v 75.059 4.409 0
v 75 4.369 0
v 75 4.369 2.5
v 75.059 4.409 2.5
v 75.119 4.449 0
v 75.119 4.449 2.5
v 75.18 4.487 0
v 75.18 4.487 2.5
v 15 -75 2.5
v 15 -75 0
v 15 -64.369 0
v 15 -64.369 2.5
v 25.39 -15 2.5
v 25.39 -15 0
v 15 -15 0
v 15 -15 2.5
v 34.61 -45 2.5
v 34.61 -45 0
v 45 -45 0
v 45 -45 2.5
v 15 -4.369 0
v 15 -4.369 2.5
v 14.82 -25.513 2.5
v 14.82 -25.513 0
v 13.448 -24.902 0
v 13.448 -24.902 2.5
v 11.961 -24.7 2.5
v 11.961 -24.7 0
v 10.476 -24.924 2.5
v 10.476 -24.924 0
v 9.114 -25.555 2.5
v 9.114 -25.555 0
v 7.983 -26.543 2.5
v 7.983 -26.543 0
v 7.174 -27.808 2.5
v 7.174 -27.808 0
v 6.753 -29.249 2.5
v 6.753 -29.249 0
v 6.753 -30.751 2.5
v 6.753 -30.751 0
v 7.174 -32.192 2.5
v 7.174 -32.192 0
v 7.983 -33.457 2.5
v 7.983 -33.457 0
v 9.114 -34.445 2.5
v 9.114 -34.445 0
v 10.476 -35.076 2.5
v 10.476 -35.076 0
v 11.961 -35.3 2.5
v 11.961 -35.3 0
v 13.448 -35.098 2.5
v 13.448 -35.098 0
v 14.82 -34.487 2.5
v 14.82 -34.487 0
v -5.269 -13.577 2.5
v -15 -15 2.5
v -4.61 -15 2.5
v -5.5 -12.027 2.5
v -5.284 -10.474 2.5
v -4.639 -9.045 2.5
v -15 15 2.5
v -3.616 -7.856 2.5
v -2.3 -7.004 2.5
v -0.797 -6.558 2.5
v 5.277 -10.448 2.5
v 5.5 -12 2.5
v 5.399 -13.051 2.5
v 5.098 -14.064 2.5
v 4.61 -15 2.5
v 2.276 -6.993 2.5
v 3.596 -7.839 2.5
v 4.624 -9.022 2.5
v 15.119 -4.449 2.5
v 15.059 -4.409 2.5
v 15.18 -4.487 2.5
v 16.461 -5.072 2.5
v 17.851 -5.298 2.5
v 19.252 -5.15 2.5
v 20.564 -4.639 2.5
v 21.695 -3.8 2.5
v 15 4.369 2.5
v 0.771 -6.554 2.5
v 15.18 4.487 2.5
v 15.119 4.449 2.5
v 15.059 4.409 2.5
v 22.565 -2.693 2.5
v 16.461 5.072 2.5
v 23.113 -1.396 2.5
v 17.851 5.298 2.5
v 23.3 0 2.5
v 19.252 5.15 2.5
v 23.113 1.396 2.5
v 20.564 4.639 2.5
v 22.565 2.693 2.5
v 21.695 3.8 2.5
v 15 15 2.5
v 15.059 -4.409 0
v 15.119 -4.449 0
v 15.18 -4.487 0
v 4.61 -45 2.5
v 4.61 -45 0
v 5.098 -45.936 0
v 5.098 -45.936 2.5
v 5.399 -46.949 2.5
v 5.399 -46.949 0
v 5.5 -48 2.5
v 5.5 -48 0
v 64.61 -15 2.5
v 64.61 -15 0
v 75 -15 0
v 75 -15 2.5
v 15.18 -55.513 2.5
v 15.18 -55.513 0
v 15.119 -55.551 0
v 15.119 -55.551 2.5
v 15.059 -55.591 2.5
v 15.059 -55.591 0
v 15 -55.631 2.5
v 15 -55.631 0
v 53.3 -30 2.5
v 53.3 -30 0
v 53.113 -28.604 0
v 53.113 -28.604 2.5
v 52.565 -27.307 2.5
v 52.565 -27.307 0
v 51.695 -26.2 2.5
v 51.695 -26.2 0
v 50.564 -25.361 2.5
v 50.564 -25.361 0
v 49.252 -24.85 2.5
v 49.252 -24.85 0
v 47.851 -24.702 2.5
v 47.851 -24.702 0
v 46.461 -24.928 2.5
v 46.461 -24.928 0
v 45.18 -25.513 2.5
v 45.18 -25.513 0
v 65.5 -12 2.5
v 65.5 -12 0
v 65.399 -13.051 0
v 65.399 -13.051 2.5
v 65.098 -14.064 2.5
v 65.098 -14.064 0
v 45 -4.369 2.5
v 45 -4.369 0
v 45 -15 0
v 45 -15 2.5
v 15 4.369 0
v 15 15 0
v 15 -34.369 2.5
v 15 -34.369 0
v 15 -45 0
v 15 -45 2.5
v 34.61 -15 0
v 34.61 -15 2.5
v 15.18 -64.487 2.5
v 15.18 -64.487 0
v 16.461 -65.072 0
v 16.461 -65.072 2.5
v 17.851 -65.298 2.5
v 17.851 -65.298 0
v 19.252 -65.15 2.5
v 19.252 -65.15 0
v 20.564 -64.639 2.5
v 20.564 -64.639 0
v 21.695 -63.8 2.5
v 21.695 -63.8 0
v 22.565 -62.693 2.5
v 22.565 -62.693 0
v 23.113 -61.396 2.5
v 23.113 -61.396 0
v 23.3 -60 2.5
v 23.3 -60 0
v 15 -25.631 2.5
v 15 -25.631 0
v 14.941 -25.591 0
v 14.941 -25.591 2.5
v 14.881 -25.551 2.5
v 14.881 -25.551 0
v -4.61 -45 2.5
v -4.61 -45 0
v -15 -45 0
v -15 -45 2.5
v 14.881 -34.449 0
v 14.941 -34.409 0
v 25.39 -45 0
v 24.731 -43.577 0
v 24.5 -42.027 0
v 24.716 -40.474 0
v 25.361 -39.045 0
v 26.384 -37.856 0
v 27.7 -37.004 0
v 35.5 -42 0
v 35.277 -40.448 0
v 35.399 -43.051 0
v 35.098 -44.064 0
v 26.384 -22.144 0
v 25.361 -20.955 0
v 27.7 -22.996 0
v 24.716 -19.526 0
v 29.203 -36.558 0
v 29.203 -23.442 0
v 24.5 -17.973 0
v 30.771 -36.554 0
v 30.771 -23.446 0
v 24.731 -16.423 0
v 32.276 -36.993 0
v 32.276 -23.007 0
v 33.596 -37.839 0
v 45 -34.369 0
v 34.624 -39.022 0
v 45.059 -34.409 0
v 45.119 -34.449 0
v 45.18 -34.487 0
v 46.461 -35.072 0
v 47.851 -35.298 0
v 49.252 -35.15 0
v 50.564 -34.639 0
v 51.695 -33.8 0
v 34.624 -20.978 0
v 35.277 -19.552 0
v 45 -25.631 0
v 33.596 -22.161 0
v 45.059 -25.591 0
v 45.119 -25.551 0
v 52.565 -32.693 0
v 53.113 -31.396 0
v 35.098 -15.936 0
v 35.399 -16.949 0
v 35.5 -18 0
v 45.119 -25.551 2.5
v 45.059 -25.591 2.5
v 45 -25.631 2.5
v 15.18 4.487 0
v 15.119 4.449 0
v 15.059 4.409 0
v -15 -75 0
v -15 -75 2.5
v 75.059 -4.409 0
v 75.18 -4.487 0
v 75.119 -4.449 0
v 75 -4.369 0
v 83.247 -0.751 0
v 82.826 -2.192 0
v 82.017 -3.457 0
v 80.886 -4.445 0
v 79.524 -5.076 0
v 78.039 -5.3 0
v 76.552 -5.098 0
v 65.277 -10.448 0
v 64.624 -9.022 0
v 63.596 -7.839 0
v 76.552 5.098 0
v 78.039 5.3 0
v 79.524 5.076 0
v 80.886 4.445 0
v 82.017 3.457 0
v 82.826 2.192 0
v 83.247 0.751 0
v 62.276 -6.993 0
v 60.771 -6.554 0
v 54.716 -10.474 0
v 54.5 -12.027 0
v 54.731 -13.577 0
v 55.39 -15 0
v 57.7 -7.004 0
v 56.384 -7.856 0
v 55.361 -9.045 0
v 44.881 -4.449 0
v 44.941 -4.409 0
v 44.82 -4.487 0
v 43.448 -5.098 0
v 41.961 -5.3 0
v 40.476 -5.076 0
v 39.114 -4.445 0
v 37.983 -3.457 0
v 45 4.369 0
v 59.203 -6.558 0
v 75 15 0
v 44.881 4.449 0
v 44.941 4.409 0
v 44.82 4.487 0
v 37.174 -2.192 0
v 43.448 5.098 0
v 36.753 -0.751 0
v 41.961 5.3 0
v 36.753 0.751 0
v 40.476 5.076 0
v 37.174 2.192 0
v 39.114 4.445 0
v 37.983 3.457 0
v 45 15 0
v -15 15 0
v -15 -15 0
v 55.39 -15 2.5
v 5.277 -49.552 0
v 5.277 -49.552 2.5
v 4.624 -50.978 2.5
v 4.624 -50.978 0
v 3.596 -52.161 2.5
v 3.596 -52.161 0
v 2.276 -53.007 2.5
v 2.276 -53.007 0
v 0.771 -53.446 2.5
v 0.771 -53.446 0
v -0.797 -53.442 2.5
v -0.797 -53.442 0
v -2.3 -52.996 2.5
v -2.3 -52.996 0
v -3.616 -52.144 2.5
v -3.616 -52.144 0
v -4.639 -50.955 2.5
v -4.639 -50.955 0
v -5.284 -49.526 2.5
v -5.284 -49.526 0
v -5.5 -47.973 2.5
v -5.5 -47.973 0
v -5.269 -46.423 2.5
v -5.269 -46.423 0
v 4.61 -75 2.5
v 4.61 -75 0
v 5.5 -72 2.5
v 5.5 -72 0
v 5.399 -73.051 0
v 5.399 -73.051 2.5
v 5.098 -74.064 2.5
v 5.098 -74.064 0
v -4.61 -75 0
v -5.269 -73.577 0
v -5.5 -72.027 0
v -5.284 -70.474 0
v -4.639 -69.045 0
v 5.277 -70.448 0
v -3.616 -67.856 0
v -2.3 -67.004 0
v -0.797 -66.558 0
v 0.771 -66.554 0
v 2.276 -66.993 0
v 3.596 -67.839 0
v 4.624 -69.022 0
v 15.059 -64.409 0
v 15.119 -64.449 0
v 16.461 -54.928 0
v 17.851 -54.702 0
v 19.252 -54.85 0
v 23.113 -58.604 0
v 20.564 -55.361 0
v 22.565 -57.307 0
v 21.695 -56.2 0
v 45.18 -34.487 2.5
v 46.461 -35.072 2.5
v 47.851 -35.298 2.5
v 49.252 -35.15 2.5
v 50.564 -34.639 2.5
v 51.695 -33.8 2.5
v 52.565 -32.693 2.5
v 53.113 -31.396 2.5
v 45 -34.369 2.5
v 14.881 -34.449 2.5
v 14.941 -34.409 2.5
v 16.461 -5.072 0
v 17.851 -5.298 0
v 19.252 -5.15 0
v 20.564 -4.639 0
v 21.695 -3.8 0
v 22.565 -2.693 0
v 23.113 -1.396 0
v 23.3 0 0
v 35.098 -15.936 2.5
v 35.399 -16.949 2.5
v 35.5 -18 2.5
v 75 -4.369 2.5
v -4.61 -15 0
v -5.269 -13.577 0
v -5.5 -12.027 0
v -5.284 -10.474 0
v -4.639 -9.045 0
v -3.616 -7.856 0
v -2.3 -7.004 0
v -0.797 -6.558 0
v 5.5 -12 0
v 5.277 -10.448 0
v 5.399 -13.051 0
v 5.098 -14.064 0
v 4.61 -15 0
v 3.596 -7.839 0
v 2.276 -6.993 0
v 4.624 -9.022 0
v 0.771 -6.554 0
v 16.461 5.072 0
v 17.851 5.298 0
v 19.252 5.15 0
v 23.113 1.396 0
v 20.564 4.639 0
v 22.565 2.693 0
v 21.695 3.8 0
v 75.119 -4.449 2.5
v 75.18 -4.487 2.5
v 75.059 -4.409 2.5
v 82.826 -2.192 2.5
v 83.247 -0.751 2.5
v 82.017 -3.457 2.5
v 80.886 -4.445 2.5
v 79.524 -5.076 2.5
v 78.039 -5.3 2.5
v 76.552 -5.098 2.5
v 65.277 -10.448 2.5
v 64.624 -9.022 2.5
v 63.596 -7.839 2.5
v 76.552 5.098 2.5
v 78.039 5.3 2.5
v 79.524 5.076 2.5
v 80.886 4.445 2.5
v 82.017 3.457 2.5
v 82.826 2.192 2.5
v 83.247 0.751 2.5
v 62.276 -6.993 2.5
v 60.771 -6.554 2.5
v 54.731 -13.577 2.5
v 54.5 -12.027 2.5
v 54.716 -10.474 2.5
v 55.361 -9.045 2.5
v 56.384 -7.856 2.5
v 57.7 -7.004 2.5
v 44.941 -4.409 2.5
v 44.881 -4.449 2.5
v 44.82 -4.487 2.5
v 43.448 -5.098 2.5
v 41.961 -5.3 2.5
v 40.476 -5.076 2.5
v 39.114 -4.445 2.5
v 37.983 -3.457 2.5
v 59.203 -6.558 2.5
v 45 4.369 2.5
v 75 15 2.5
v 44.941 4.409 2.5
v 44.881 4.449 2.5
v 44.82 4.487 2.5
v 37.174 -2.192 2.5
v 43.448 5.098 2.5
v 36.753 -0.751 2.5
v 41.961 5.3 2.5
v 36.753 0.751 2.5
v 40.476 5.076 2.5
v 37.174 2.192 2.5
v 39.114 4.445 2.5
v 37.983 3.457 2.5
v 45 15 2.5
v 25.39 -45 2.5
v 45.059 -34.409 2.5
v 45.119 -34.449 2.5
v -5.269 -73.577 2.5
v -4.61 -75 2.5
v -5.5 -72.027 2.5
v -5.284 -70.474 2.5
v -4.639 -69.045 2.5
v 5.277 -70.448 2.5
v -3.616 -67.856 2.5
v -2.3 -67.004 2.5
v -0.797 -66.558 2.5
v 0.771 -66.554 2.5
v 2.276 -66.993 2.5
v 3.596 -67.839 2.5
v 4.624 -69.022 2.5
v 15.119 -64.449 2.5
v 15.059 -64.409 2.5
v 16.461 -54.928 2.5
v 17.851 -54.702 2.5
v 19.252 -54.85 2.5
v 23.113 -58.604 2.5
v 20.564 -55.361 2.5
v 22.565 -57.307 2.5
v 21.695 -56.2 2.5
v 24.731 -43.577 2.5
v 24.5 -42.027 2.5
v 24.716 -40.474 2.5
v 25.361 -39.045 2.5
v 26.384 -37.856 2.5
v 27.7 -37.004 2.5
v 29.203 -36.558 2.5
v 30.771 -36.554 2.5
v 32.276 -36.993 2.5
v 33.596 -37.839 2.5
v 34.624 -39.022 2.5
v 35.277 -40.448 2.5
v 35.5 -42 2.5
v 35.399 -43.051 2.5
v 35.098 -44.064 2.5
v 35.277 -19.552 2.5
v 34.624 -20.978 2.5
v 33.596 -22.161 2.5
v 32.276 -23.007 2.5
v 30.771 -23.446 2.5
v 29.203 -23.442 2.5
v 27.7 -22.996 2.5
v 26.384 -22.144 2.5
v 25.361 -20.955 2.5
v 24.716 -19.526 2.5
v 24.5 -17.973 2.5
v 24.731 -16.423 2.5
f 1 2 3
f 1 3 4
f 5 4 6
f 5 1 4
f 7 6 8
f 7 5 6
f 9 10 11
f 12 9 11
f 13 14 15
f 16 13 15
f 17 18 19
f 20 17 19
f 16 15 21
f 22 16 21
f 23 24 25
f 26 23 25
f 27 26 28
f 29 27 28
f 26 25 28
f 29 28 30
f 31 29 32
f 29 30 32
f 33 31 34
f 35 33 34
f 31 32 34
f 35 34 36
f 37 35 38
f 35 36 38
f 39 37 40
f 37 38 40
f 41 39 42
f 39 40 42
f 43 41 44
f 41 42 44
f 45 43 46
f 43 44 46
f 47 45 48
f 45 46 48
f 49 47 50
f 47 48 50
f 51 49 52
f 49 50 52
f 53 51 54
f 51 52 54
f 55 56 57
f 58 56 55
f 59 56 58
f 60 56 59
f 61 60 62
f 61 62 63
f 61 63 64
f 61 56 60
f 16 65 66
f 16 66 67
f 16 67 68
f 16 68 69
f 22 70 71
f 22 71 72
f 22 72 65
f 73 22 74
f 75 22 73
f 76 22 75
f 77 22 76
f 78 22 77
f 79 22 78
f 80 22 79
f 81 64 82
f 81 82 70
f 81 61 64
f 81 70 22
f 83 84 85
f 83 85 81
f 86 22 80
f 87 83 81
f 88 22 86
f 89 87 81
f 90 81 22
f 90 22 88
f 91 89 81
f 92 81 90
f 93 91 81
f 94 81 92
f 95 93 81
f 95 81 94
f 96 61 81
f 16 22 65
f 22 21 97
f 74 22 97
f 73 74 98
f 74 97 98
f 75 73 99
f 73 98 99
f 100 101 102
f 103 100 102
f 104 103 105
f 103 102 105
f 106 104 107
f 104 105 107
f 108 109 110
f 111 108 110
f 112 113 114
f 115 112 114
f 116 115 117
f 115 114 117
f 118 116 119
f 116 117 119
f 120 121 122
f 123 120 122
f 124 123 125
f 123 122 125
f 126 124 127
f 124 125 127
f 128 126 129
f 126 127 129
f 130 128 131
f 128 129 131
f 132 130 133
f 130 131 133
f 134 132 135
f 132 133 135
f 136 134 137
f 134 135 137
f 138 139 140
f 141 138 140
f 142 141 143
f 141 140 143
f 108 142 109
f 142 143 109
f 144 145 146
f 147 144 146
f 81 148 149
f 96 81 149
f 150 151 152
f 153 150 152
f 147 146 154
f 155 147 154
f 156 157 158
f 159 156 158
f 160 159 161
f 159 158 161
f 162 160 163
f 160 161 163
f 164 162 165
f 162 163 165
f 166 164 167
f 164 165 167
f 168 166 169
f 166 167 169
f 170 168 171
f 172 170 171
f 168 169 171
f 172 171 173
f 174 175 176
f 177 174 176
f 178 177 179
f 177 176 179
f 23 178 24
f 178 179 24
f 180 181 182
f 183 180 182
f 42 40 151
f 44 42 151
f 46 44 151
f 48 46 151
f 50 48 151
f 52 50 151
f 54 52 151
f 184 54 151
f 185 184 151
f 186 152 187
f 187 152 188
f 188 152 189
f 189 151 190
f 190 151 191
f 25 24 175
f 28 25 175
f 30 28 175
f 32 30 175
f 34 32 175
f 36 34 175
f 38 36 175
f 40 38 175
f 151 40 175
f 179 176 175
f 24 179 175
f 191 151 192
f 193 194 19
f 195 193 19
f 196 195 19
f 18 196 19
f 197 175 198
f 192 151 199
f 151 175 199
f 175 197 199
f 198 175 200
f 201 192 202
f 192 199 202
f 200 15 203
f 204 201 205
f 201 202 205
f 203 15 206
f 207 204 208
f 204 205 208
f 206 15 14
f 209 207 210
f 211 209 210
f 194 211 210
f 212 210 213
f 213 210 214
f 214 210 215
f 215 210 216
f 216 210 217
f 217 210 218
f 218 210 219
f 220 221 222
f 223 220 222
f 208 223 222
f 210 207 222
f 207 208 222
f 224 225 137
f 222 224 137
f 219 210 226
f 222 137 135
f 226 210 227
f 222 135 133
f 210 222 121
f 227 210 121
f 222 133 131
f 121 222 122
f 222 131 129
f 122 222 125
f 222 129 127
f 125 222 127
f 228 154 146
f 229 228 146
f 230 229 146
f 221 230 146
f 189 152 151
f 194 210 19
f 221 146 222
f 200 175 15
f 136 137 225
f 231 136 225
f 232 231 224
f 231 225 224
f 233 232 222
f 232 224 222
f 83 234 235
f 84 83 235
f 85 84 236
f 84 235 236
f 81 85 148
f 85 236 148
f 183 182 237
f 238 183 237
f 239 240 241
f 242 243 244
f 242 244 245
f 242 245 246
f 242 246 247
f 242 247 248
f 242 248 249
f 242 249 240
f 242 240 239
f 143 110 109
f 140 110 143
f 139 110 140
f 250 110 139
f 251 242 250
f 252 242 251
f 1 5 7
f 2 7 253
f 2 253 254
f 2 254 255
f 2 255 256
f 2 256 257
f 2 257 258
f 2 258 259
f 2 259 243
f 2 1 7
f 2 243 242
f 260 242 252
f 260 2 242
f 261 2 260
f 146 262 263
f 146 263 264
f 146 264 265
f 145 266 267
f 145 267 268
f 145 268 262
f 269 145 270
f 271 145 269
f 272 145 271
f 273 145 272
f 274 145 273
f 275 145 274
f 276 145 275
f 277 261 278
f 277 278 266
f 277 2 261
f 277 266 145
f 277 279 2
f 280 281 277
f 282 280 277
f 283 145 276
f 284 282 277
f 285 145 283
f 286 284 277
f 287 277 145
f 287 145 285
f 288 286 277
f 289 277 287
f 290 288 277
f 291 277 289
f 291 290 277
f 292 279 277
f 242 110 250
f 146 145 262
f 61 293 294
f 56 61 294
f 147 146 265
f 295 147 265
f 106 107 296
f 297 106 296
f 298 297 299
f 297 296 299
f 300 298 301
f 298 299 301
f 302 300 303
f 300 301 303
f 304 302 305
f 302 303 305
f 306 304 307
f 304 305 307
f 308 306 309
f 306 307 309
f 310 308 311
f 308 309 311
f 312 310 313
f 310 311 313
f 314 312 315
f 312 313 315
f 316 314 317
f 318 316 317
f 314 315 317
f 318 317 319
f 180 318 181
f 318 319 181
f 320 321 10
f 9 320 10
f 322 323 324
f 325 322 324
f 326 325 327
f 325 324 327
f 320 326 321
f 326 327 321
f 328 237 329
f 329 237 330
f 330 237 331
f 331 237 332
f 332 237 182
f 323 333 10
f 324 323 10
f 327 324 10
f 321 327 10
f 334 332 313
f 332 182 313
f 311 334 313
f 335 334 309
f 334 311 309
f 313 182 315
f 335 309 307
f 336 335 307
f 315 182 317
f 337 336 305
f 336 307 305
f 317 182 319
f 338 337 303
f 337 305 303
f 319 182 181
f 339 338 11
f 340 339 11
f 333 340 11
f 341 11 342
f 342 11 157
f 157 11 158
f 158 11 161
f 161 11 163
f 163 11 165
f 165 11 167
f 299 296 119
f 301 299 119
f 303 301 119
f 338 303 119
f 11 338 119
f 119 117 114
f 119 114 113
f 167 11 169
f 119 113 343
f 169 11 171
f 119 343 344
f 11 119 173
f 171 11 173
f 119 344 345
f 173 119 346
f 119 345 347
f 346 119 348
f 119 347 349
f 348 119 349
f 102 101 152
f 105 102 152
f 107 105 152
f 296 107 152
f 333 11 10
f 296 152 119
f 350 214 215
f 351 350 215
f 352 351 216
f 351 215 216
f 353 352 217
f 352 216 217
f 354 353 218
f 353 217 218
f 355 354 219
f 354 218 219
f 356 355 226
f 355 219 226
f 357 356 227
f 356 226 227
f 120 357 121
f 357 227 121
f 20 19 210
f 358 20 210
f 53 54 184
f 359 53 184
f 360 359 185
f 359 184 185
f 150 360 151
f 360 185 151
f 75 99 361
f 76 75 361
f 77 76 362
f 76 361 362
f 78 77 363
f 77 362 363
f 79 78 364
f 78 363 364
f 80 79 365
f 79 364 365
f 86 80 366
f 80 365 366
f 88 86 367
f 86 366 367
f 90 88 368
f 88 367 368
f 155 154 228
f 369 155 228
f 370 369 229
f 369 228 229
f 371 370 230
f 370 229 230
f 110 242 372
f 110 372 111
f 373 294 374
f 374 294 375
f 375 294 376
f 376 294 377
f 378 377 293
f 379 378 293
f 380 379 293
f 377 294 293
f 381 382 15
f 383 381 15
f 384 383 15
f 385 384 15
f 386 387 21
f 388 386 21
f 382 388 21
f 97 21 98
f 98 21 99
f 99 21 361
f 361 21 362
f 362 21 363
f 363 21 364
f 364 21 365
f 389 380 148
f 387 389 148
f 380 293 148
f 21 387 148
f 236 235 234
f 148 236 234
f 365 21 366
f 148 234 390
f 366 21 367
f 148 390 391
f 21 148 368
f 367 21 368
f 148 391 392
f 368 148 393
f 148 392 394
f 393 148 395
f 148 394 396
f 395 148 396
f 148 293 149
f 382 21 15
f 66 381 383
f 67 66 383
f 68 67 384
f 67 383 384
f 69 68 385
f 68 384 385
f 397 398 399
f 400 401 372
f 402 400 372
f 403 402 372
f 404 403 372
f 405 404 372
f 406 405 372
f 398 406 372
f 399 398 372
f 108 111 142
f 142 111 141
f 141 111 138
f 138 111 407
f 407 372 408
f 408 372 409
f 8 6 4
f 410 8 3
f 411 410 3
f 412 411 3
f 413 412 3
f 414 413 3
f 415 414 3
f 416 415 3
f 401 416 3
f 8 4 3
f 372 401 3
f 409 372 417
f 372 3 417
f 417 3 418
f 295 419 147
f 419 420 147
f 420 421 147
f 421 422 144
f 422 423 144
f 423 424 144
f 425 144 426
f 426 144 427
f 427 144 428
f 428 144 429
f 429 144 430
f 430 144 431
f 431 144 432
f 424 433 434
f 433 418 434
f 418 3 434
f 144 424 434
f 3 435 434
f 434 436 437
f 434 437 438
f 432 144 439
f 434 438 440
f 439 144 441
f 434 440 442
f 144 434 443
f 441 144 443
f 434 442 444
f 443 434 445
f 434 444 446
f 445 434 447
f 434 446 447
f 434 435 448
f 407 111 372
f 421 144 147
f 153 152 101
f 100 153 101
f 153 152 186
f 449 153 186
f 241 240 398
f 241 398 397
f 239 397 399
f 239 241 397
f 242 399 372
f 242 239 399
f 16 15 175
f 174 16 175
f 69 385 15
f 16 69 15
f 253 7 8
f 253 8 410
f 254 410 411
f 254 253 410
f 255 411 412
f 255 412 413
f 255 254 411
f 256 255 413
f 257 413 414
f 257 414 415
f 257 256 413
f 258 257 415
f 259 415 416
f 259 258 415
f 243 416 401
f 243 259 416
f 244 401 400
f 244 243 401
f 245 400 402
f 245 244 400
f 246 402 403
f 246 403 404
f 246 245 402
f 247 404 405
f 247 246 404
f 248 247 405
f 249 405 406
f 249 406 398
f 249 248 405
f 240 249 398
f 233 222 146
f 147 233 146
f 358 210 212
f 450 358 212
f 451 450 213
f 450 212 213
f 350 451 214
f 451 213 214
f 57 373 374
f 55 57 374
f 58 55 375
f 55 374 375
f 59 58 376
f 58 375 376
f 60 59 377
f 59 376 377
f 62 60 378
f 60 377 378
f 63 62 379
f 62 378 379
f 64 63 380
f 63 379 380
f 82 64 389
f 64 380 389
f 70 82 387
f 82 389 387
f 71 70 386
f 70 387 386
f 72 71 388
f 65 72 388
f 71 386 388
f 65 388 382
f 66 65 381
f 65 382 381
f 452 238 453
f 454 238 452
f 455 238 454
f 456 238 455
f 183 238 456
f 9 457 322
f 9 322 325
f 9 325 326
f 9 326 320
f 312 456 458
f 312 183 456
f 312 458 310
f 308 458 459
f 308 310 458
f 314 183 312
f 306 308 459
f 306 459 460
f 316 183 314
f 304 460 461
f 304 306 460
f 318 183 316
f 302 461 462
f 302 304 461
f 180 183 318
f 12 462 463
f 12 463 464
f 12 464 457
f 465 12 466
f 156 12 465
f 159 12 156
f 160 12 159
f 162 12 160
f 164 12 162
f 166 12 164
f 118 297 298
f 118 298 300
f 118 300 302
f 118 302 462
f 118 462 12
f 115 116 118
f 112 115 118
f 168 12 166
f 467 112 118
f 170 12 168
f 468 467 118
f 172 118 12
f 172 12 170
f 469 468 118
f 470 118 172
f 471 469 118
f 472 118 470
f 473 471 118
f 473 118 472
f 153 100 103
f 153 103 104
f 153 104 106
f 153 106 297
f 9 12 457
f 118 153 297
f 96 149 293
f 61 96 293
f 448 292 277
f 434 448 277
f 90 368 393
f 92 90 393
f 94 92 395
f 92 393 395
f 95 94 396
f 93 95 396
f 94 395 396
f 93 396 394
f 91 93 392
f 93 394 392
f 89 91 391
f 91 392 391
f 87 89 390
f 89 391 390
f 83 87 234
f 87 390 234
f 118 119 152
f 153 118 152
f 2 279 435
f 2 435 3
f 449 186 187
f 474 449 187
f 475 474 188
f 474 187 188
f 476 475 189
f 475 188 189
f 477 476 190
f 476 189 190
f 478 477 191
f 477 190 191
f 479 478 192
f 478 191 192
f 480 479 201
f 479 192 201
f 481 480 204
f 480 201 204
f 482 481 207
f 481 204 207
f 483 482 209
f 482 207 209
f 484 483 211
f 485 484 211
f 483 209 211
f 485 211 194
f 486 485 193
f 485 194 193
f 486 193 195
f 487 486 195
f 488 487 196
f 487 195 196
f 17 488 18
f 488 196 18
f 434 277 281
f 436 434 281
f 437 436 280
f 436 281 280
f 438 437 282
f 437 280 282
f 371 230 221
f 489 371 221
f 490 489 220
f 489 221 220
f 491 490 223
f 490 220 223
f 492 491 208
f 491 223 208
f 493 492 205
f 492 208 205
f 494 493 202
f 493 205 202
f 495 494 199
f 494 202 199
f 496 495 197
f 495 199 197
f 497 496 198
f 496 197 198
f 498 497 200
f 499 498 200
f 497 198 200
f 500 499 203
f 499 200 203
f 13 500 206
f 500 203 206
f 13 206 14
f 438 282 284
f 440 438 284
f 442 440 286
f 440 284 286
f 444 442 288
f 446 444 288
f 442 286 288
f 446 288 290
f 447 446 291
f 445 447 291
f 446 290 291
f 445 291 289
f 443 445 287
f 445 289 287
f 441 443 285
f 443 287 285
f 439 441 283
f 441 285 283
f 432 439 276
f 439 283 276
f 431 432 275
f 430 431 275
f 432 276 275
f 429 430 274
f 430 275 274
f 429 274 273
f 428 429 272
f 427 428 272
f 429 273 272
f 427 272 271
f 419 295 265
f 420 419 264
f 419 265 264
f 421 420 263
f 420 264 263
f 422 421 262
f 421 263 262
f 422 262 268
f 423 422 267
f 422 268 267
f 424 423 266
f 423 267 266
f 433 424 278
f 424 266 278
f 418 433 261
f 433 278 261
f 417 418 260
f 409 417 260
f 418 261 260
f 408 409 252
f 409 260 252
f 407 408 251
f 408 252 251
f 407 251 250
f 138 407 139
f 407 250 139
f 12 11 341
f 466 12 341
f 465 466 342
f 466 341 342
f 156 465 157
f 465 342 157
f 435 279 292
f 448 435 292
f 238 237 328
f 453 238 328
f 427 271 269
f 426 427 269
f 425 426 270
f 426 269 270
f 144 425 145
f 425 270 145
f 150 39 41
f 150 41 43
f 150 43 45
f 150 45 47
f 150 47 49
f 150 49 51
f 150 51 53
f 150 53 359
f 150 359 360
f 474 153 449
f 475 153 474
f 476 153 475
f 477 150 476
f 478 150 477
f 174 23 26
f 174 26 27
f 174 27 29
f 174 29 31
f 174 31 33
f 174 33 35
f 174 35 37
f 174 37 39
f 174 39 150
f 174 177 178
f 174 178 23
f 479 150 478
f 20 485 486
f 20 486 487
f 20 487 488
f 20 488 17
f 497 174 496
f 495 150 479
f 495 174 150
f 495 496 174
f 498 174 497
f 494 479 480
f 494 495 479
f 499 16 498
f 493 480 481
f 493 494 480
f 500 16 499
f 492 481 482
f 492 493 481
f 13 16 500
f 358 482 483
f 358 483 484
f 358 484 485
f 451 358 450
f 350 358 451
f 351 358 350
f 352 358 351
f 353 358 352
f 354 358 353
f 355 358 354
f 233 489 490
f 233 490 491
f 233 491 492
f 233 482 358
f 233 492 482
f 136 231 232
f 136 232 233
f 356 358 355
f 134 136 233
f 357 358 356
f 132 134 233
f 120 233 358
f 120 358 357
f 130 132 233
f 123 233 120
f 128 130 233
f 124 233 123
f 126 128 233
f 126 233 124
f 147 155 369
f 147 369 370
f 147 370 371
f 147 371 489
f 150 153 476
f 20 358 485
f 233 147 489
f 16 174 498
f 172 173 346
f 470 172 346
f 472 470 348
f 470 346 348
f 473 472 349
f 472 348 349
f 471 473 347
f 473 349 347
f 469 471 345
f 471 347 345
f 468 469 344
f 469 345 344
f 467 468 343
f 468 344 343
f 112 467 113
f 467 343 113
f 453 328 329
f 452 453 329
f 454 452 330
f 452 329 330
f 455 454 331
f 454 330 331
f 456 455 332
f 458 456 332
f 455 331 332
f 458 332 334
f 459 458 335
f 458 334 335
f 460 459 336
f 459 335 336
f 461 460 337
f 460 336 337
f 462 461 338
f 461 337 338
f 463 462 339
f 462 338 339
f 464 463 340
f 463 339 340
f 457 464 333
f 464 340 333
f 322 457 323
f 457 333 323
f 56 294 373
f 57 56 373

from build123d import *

# Parameters (mm, degrees)
F1_DEPTH = 2.5
F2_DEPTH = 2.5
F3_DEPTH = 2.5
F4_DEPTH = 2.5
F5_ANGLE = 45
F7_ANGLE = -45


# Not quite as in the source:
# - a pattern or mirror of a feature is missing from the dataset's text; its kind, count and spacing are read off the source's solid
# - a feature names something its author has since deleted; it is built from what else it names


with BuildPart() as f1:
    # F0 (on Top) → F1 (new body)
    with BuildSketch(Plane.XY):
        with BuildLine():
            Line((15, 4.6097722286), (15, 15))
            Line((15, 15), (4.6097722286, 15))
            ThreePointArc((4.6097722286, 15), (5.2727482046, 13.564648961), (5.5, 12))
            ThreePointArc((5.5, 12), (-1.564648961, 6.7272517954), (-4.6097722286, 15))
            Line((-4.6097722286, 15), (-15, 15))
            Line((-15, 15), (-15, 4.6097722286))
            ThreePointArc((-15, 4.6097722286), (-9.3779778796, 4.8347699015), (-6.5, 0))
            ThreePointArc((-6.5, 0), (-9.3779778796, -4.8347699015), (-15, -4.6097722286))
            Line((-15, -4.6097722286), (-15, -15))
            Line((-15, -15), (-4.6097722286, -15))
            ThreePointArc((-4.6097722286, -15), (-1.564648961, -6.7272517954), (5.5, -12))
            ThreePointArc((5.5, -12), (5.2727482046, -13.564648961), (4.6097722286, -15))
            Line((4.6097722286, -15), (15, -15))
            Line((15, -15), (15, -4.6097722286))
            ThreePointArc((15, -4.6097722286), (6.5, 0), (15, 4.6097722286))
        make_face()
        with BuildLine():
            ThreePointArc((5.5, 12), (5.2727482046, 13.564648961), (4.6097722286, 15))
            Line((4.6097722286, 15), (4.369210455, 15))
            ThreePointArc((4.369210455, 15), (5.0619569048, 13.5705388547), (5.3, 12))
            ThreePointArc((5.3, 12), (-1.5705388547, 6.9380430952), (-4.369210455, 15))
            Line((-4.369210455, 15), (-4.6097722286, 15))
            ThreePointArc((-4.6097722286, 15), (-1.564648961, 6.7272517954), (5.5, 12))
        make_face()
        with BuildLine():
            ThreePointArc((15.18, 4.4874937326), (15.0893990769, 4.4292665608), (15, 4.369210455))
            ThreePointArc((15, 4.369210455), (16.6898827277, 2.4688053791), (17.3, 0))
            ThreePointArc((17.3, 0), (16.6898827277, -2.4688053791), (15, -4.369210455))
            ThreePointArc((15, -4.369210455), (15.0893990769, -4.4292665608), (15.18, -4.4874937326))
            ThreePointArc((15.18, -4.4874937326), (16.8856934001, -2.5258661881), (17.5, 0))
            ThreePointArc((17.5, 0), (16.8856934001, 2.5258661881), (15.18, 4.4874937326))
        make_face()
        with BuildLine():
            ThreePointArc((-6.7, 0), (-9.5311946209, 4.6898827277), (-15, 4.369210455))
            Line((-15, 4.369210455), (-15, -4.369210455))
            ThreePointArc((-15, -4.369210455), (-9.5311946209, -4.6898827277), (-6.7, 0))
        make_face()
        with BuildLine():
            ThreePointArc((5.3, 12), (5.0619569048, 13.5705388547), (4.369210455, 15))
            Line((4.369210455, 15), (-4.369210455, 15))
            ThreePointArc((-4.369210455, 15), (-1.5705388547, 6.9380430952), (5.3, 12))
        make_face()
        with BuildLine():
            ThreePointArc((14.82, -4.4874937326), (12.5, 0), (14.82, 4.4874937326))
            ThreePointArc((14.82, 4.4874937326), (6.7, 0), (14.82, -4.4874937326))
        make_face()
        with BuildLine():
            Line((15, -4.369210455), (15, 4.369210455))
            ThreePointArc((15, 4.369210455), (12.7, 0), (15, -4.369210455))
        make_face()
        with BuildLine():
            ThreePointArc((17.3, 0), (16.6898827277, 2.4688053791), (15, 4.369210455))
            Line((15, 4.369210455), (15, -4.369210455))
            ThreePointArc((15, -4.369210455), (16.6898827277, -2.4688053791), (17.3, 0))
        make_face()
        with BuildLine():
            ThreePointArc((23.3, 0), (20.5635912311, 4.6387498316), (15.18, 4.4874937326))
            ThreePointArc((15.18, 4.4874937326), (16.8856934001, 2.5258661881), (17.5, 0))
            ThreePointArc((17.5, 0), (16.8856934001, -2.5258661881), (15.18, -4.4874937326))
            ThreePointArc((15.18, -4.4874937326), (20.5635912311, -4.6387498316), (23.3, 0))
        make_face()
        with BuildLine():
            ThreePointArc((15, -4.369210455), (12.7, 0), (15, 4.369210455))
            ThreePointArc((15, 4.369210455), (14.9106009231, 4.4292665608), (14.82, 4.4874937326))
            ThreePointArc((14.82, 4.4874937326), (12.5, 0), (14.82, -4.4874937326))
            ThreePointArc((14.82, -4.4874937326), (14.9106009231, -4.4292665608), (15, -4.369210455))
        make_face()
        with BuildLine():
            ThreePointArc((-6.5, 0), (-9.3779778796, 4.8347699015), (-15, 4.6097722286))
            Line((-15, 4.6097722286), (-15, 4.369210455))
            ThreePointArc((-15, 4.369210455), (-9.5311946209, 4.6898827277), (-6.7, 0))
            ThreePointArc((-6.7, 0), (-9.5311946209, -4.6898827277), (-15, -4.369210455))
            Line((-15, -4.369210455), (-15, -4.6097722286))
            ThreePointArc((-15, -4.6097722286), (-9.3779778796, -4.8347699015), (-6.5, 0))
        make_face()
        with BuildLine():
            ThreePointArc((14.82, 4.4874937326), (14.9093952036, 4.5495232709), (15, 4.6097722286))
            ThreePointArc((15, 4.6097722286), (6.5, 0), (15, -4.6097722286))
            ThreePointArc((15, -4.6097722286), (14.9093952036, -4.5495232709), (14.82, -4.4874937326))
            ThreePointArc((14.82, -4.4874937326), (6.7, 0), (14.82, 4.4874937326))
        make_face()
        with BuildLine():
            Line((15, 4.369210455), (15, 4.6097722286))
            ThreePointArc((15, 4.6097722286), (14.9093952036, 4.5495232709), (14.82, 4.4874937326))
            ThreePointArc((14.82, 4.4874937326), (14.9106009231, 4.4292665608), (15, 4.369210455))
        make_face()
        with BuildLine():
            ThreePointArc((14.82, -4.4874937326), (14.9093952036, -4.5495232709), (15, -4.6097722286))
            Line((15, -4.6097722286), (15, -4.369210455))
            ThreePointArc((15, -4.369210455), (14.9106009231, -4.4292665608), (14.82, -4.4874937326))
        make_face()
    extrude(amount=F1_DEPTH)


with BuildPart() as f2:
    # F0 (on Top) → F2 (new body)
    with BuildSketch(Plane.XY):
        with BuildLine():
            ThreePointArc((44.82, -4.4874937326), (42.5, 0), (44.82, 4.4874937326))
            ThreePointArc((44.82, 4.4874937326), (36.7, 0), (44.82, -4.4874937326))
        make_face()
        with BuildLine():
            Line((45, -4.369210455), (45, 4.369210455))
            ThreePointArc((45, 4.369210455), (42.7, 0), (45, -4.369210455))
        make_face()
        with BuildLine():
            ThreePointArc((45, -4.369210455), (42.7, 0), (45, 4.369210455))
            ThreePointArc((45, 4.369210455), (44.9106009231, 4.4292665608), (44.82, 4.4874937326))
            ThreePointArc((44.82, 4.4874937326), (42.5, 0), (44.82, -4.4874937326))
            ThreePointArc((44.82, -4.4874937326), (44.9106009231, -4.4292665608), (45, -4.369210455))
        make_face()
        with BuildLine():
            ThreePointArc((47.3, 0), (46.6898827277, 2.4688053791), (45, 4.369210455))
            Line((45, 4.369210455), (45, -4.369210455))
            ThreePointArc((45, -4.369210455), (46.6898827277, -2.4688053791), (47.3, 0))
        make_face()
        with BuildLine():
            ThreePointArc((47.5, 0), (46.8856934001, 2.5258661881), (45.18, 4.4874937326))
            ThreePointArc((45.18, 4.4874937326), (45.0893990769, 4.4292665608), (45, 4.369210455))
            ThreePointArc((45, 4.369210455), (46.6898827277, 2.4688053791), (47.3, 0))
            ThreePointArc((47.3, 0), (46.6898827277, -2.4688053791), (45, -4.369210455))
            ThreePointArc((45, -4.369210455), (45.0893990769, -4.4292665608), (45.18, -4.4874937326))
            ThreePointArc((45.18, -4.4874937326), (46.8856934001, -2.5258661881), (47.5, 0))
        make_face()
        with BuildLine():
            ThreePointArc((53.3, 0), (50.5635912311, 4.6387498316), (45.18, 4.4874937326))
            ThreePointArc((45.18, 4.4874937326), (46.8856934001, 2.5258661881), (47.5, 0))
            ThreePointArc((47.5, 0), (46.8856934001, -2.5258661881), (45.18, -4.4874937326))
            ThreePointArc((45.18, -4.4874937326), (50.5635912311, -4.6387498316), (53.3, 0))
        make_face()
        with BuildLine():
            ThreePointArc((53.5, 0), (50.6220221204, 4.8347699015), (45, 4.6097722286))
            ThreePointArc((45, 4.6097722286), (45.0906047964, 4.5495232709), (45.18, 4.4874937326))
            ThreePointArc((45.18, 4.4874937326), (50.5635912311, 4.6387498316), (53.3, 0))
            ThreePointArc((53.3, 0), (50.5635912311, -4.6387498316), (45.18, -4.4874937326))
            ThreePointArc((45.18, -4.4874937326), (45.0906047964, -4.5495232709), (45, -4.6097722286))
            ThreePointArc((45, -4.6097722286), (50.6220221204, -4.8347699015), (53.5, 0))
        make_face()
        with BuildLine():
            Line((55.3902277714, 15), (45, 15))
            Line((45, 15), (45, 4.6097722286))
            ThreePointArc((45, 4.6097722286), (50.6220221204, 4.8347699015), (53.5, 0))
            ThreePointArc((53.5, 0), (50.6220221204, -4.8347699015), (45, -4.6097722286))
            Line((45, -4.6097722286), (45, -15))
            Line((45, -15), (55.3902277714, -15))
            ThreePointArc((55.3902277714, -15), (58.435351039, -6.7272517954), (65.5, -12))
            ThreePointArc((65.5, -12), (65.2727482046, -13.564648961), (64.6097722286, -15))
            Line((64.6097722286, -15), (75, -15))
            Line((75, -15), (75, -4.6097722286))
            ThreePointArc((75, -4.6097722286), (66.5, 0), (75, 4.6097722286))
            Line((75, 4.6097722286), (75, 15))
            Line((75, 15), (64.6097722286, 15))
            ThreePointArc((64.6097722286, 15), (65.2727482046, 13.564648961), (65.5, 12))
            ThreePointArc((65.5, 12), (58.435351039, 6.7272517954), (55.3902277714, 15))
        make_face()
        with BuildLine():
            ThreePointArc((45.18, 4.4874937326), (45.0906047964, 4.5495232709), (45, 4.6097722286))
            Line((45, 4.6097722286), (45, 4.369210455))
            ThreePointArc((45, 4.369210455), (45.0893990769, 4.4292665608), (45.18, 4.4874937326))
        make_face()
        with BuildLine():
            Line((45, -4.369210455), (45, -4.6097722286))
            ThreePointArc((45, -4.6097722286), (45.0906047964, -4.5495232709), (45.18, -4.4874937326))
            ThreePointArc((45.18, -4.4874937326), (45.0893990769, -4.4292665608), (45, -4.369210455))
        make_face()
        with BuildLine():
            Line((64.369210455, 15), (55.630789545, 15))
            ThreePointArc((55.630789545, 15), (58.4294611453, 6.9380430952), (65.3, 12))
            ThreePointArc((65.3, 12), (65.0619569048, 13.5705388547), (64.369210455, 15))
        make_face()
        with BuildLine():
            Line((55.630789545, 15), (55.3902277714, 15))
            ThreePointArc((55.3902277714, 15), (58.435351039, 6.7272517954), (65.5, 12))
            ThreePointArc((65.5, 12), (65.2727482046, 13.564648961), (64.6097722286, 15))
            Line((64.6097722286, 15), (64.369210455, 15))
            ThreePointArc((64.369210455, 15), (65.0619569048, 13.5705388547), (65.3, 12))
            ThreePointArc((65.3, 12), (58.4294611453, 6.9380430952), (55.630789545, 15))
        make_face()
    extrude(amount=F2_DEPTH)



with BuildPart() as f2b:
    # F0 (on Top) → F2, piece 2 (new body)
    with BuildSketch(Plane.XY):
        with BuildLine():
            ThreePointArc((77.3, 0), (76.6898827277, 2.4688053791), (75, 4.369210455))
            Line((75, 4.369210455), (75, -4.369210455))
            ThreePointArc((75, -4.369210455), (76.6898827277, -2.4688053791), (77.3, 0))
        make_face()
        with BuildLine():
            Line((75, -4.369210455), (75, 4.369210455))
            ThreePointArc((75, 4.369210455), (72.7, 0), (75, -4.369210455))
        make_face()
    extrude(amount=F2_DEPTH)


with BuildPart() as f2_1:
    add(f2.part)

    add(f2b.part)  # F2_copies merges F2b
    # F2_copies: F2 across plane
    add(f2.part.mirror(Plane(origin=(60, 0, 0), x_dir=(0, 0, 1), z_dir=(1, 0, 0))))


with BuildPart() as f3:
    # F0 (on Top) → F3 (new body)
    with BuildSketch(Plane.XY):
        with BuildLine():
            Line((15, -55.3902277714), (15, -45))
            Line((15, -45), (4.6097722286, -45))
            ThreePointArc((4.6097722286, -45), (5.2727482046, -46.435351039), (5.5, -48))
            ThreePointArc((5.5, -48), (-1.564648961, -53.2727482046), (-4.6097722286, -45))
            Line((-4.6097722286, -45), (-15, -45))
            Line((-15, -45), (-15, -55.3902277714))
            ThreePointArc((-15, -55.3902277714), (-9.3779778796, -55.1652300985), (-6.5, -60))
            ThreePointArc((-6.5, -60), (-9.3779778796, -64.8347699015), (-15, -64.6097722286))
            Line((-15, -64.6097722286), (-15, -75))
            Line((-15, -75), (-4.6097722286, -75))
            ThreePointArc((-4.6097722286, -75), (-1.564648961, -66.7272517954), (5.5, -72))
            ThreePointArc((5.5, -72), (5.2727482046, -73.564648961), (4.6097722286, -75))
            Line((4.6097722286, -75), (15, -75))
            Line((15, -75), (15, -64.6097722286))
            ThreePointArc((15, -64.6097722286), (6.5, -60), (15, -55.3902277714))
        make_face()
        with BuildLine():
            ThreePointArc((-6.7, -60), (-9.5311946209, -55.3101172723), (-15, -55.630789545))
            Line((-15, -55.630789545), (-15, -64.369210455))
            ThreePointArc((-15, -64.369210455), (-9.5311946209, -64.6898827277), (-6.7, -60))
        make_face()
        with BuildLine():
            ThreePointArc((14.82, -64.4874937326), (12.5, -60), (14.82, -55.5125062674))
            ThreePointArc((14.82, -55.5125062674), (6.7, -60), (14.82, -64.4874937326))
        make_face()
        with BuildLine():
            ThreePointArc((23.3, -60), (20.5635912311, -55.3612501684), (15.18, -55.5125062674))
            ThreePointArc((15.18, -55.5125062674), (16.8856934001, -57.4741338119), (17.5, -60))
            ThreePointArc((17.5, -60), (16.8856934001, -62.5258661881), (15.18, -64.4874937326))
            ThreePointArc((15.18, -64.4874937326), (20.5635912311, -64.6387498316), (23.3, -60))
        make_face()
        with BuildLine():
            ThreePointArc((17.3, -60), (16.6898827277, -57.5311946209), (15, -55.630789545))
            Line((15, -55.630789545), (15, -64.369210455))
            ThreePointArc((15, -64.369210455), (16.6898827277, -62.4688053791), (17.3, -60))
        make_face()
        with BuildLine():
            Line((15, -64.369210455), (15, -55.630789545))
            ThreePointArc((15, -55.630789545), (12.7, -60), (15, -64.369210455))
        make_face()
        with BuildLine():
            ThreePointArc((-6.5, -60), (-9.3779778796, -55.1652300985), (-15, -55.3902277714))
            Line((-15, -55.3902277714), (-15, -55.630789545))
            ThreePointArc((-15, -55.630789545), (-9.5311946209, -55.3101172723), (-6.7, -60))
            ThreePointArc((-6.7, -60), (-9.5311946209, -64.6898827277), (-15, -64.369210455))
            Line((-15, -64.369210455), (-15, -64.6097722286))
            ThreePointArc((-15, -64.6097722286), (-9.3779778796, -64.8347699015), (-6.5, -60))
        make_face()
        with BuildLine():
            ThreePointArc((14.82, -55.5125062674), (14.9093952036, -55.4504767291), (15, -55.3902277714))
            ThreePointArc((15, -55.3902277714), (6.5, -60), (15, -64.6097722286))
            ThreePointArc((15, -64.6097722286), (14.9093952036, -64.5495232709), (14.82, -64.4874937326))
            ThreePointArc((14.82, -64.4874937326), (6.7, -60), (14.82, -55.5125062674))
        make_face()
        with BuildLine():
            ThreePointArc((15, -64.369210455), (12.7, -60), (15, -55.630789545))
            ThreePointArc((15, -55.630789545), (14.9106009231, -55.5707334392), (14.82, -55.5125062674))
            ThreePointArc((14.82, -55.5125062674), (12.5, -60), (14.82, -64.4874937326))
            ThreePointArc((14.82, -64.4874937326), (14.9106009231, -64.4292665608), (15, -64.369210455))
        make_face()
        with BuildLine():
            ThreePointArc((17.5, -60), (16.8856934001, -57.4741338119), (15.18, -55.5125062674))
            ThreePointArc((15.18, -55.5125062674), (15.0893990769, -55.5707334392), (15, -55.630789545))
            ThreePointArc((15, -55.630789545), (16.6898827277, -57.5311946209), (17.3, -60))
            ThreePointArc((17.3, -60), (16.6898827277, -62.4688053791), (15, -64.369210455))
            ThreePointArc((15, -64.369210455), (15.0893990769, -64.4292665608), (15.18, -64.4874937326))
            ThreePointArc((15.18, -64.4874937326), (16.8856934001, -62.5258661881), (17.5, -60))
        make_face()
        with BuildLine():
            Line((15, -55.630789545), (15, -55.3902277714))
            ThreePointArc((15, -55.3902277714), (14.9093952036, -55.4504767291), (14.82, -55.5125062674))
            ThreePointArc((14.82, -55.5125062674), (14.9106009231, -55.5707334392), (15, -55.630789545))
        make_face()
        with BuildLine():
            ThreePointArc((14.82, -64.4874937326), (14.9093952036, -64.5495232709), (15, -64.6097722286))
            Line((15, -64.6097722286), (15, -64.369210455))
            ThreePointArc((15, -64.369210455), (14.9106009231, -64.4292665608), (14.82, -64.4874937326))
        make_face()
    extrude(amount=F3_DEPTH)


with BuildPart() as f4:
    # F0 (on Top) → F4 (new body)
    with BuildSketch(Plane.XY):
        with BuildLine():
            ThreePointArc((14.82, -34.4874937326), (12.5, -30), (14.82, -25.5125062674))
            ThreePointArc((14.82, -25.5125062674), (6.7, -30), (14.82, -34.4874937326))
        make_face()
        with BuildLine():
            Line((25.3902277714, -15), (15, -15))
            Line((15, -15), (15, -25.3902277714))
            ThreePointArc((15, -25.3902277714), (20.6220221204, -25.1652300985), (23.5, -30))
            ThreePointArc((23.5, -30), (20.6220221204, -34.8347699015), (15, -34.6097722286))
            Line((15, -34.6097722286), (15, -45))
            Line((15, -45), (25.3902277714, -45))
            ThreePointArc((25.3902277714, -45), (28.435351039, -36.7272517954), (35.5, -42))
            ThreePointArc((35.5, -42), (35.2727482046, -43.564648961), (34.6097722286, -45))
            Line((34.6097722286, -45), (45, -45))
            Line((45, -45), (45, -34.6097722286))
            ThreePointArc((45, -34.6097722286), (36.5, -30), (45, -25.3902277714))
            Line((45, -25.3902277714), (45, -15))
            Line((45, -15), (34.6097722286, -15))
            ThreePointArc((34.6097722286, -15), (35.2727482046, -16.435351039), (35.5, -18))
            ThreePointArc((35.5, -18), (28.435351039, -23.2727482046), (25.3902277714, -15))
        make_face()
        with BuildLine():
            ThreePointArc((23.3, -30), (20.5635912311, -25.3612501684), (15.18, -25.5125062674))
            ThreePointArc((15.18, -25.5125062674), (16.8856934001, -27.4741338119), (17.5, -30))
            ThreePointArc((17.5, -30), (16.8856934001, -32.5258661881), (15.18, -34.4874937326))
            ThreePointArc((15.18, -34.4874937326), (20.5635912311, -34.6387498316), (23.3, -30))
        make_face()
        with BuildLine():
            ThreePointArc((17.3, -30), (16.6898827277, -27.5311946209), (15, -25.630789545))
            Line((15, -25.630789545), (15, -34.369210455))
            ThreePointArc((15, -34.369210455), (16.6898827277, -32.4688053791), (17.3, -30))
        make_face()
        with BuildLine():
            Line((15, -34.369210455), (15, -25.630789545))
            ThreePointArc((15, -25.630789545), (12.7, -30), (15, -34.369210455))
        make_face()
        with BuildLine():
            ThreePointArc((53.3, -30), (50.5635912311, -25.3612501684), (45.18, -25.5125062674))
            ThreePointArc((45.18, -25.5125062674), (46.8856934001, -27.4741338119), (47.5, -30))
            ThreePointArc((47.5, -30), (46.8856934001, -32.5258661881), (45.18, -34.4874937326))
            ThreePointArc((45.18, -34.4874937326), (50.5635912311, -34.6387498316), (53.3, -30))
        make_face()
        with BuildLine():
            ThreePointArc((47.3, -30), (46.6898827277, -27.5311946209), (45, -25.630789545))
            Line((45, -25.630789545), (45, -34.369210455))
            ThreePointArc((45, -34.369210455), (46.6898827277, -32.4688053791), (47.3, -30))
        make_face()
        with BuildLine():
            Line((45, -34.369210455), (45, -25.630789545))
            ThreePointArc((45, -25.630789545), (42.7, -30), (45, -34.369210455))
        make_face()
        with BuildLine():
            ThreePointArc((44.82, -34.4874937326), (42.5, -30), (44.82, -25.5125062674))
            ThreePointArc((44.82, -25.5125062674), (36.7, -30), (44.82, -34.4874937326))
        make_face()
        with BuildLine():
            ThreePointArc((17.5, -30), (16.8856934001, -27.4741338119), (15.18, -25.5125062674))
            ThreePointArc((15.18, -25.5125062674), (15.0893990769, -25.5707334392), (15, -25.630789545))
            ThreePointArc((15, -25.630789545), (16.6898827277, -27.5311946209), (17.3, -30))
            ThreePointArc((17.3, -30), (16.6898827277, -32.4688053791), (15, -34.369210455))
            ThreePointArc((15, -34.369210455), (15.0893990769, -34.4292665608), (15.18, -34.4874937326))
            ThreePointArc((15.18, -34.4874937326), (16.8856934001, -32.5258661881), (17.5, -30))
        make_face()
        with BuildLine():
            ThreePointArc((15, -34.369210455), (12.7, -30), (15, -25.630789545))
            ThreePointArc((15, -25.630789545), (14.9106009231, -25.5707334392), (14.82, -25.5125062674))
            ThreePointArc((14.82, -25.5125062674), (12.5, -30), (14.82, -34.4874937326))
            ThreePointArc((14.82, -34.4874937326), (14.9106009231, -34.4292665608), (15, -34.369210455))
        make_face()
        with BuildLine():
            ThreePointArc((23.5, -30), (20.6220221204, -25.1652300985), (15, -25.3902277714))
            ThreePointArc((15, -25.3902277714), (15.0906047964, -25.4504767291), (15.18, -25.5125062674))
            ThreePointArc((15.18, -25.5125062674), (20.5635912311, -25.3612501684), (23.3, -30))
            ThreePointArc((23.3, -30), (20.5635912311, -34.6387498316), (15.18, -34.4874937326))
            ThreePointArc((15.18, -34.4874937326), (15.0906047964, -34.5495232709), (15, -34.6097722286))
            ThreePointArc((15, -34.6097722286), (20.6220221204, -34.8347699015), (23.5, -30))
        make_face()
        with BuildLine():
            ThreePointArc((15.18, -25.5125062674), (15.0906047964, -25.4504767291), (15, -25.3902277714))
            Line((15, -25.3902277714), (15, -25.630789545))
            ThreePointArc((15, -25.630789545), (15.0893990769, -25.5707334392), (15.18, -25.5125062674))
        make_face()
        with BuildLine():
            Line((15, -34.369210455), (15, -34.6097722286))
            ThreePointArc((15, -34.6097722286), (15.0906047964, -34.5495232709), (15.18, -34.4874937326))
            ThreePointArc((15.18, -34.4874937326), (15.0893990769, -34.4292665608), (15, -34.369210455))
        make_face()
        with BuildLine():
            ThreePointArc((44.82, -25.5125062674), (44.9093952036, -25.4504767291), (45, -25.3902277714))
            ThreePointArc((45, -25.3902277714), (36.5, -30), (45, -34.6097722286))
            ThreePointArc((45, -34.6097722286), (44.9093952036, -34.5495232709), (44.82, -34.4874937326))
            ThreePointArc((44.82, -34.4874937326), (36.7, -30), (44.82, -25.5125062674))
        make_face()
        with BuildLine():
            ThreePointArc((44.82, -34.4874937326), (44.9093952036, -34.5495232709), (45, -34.6097722286))
            Line((45, -34.6097722286), (45, -34.369210455))
            ThreePointArc((45, -34.369210455), (44.9106009231, -34.4292665608), (44.82, -34.4874937326))
        make_face()
        with BuildLine():
            ThreePointArc((45, -34.369210455), (42.7, -30), (45, -25.630789545))
            ThreePointArc((45, -25.630789545), (44.9106009231, -25.5707334392), (44.82, -25.5125062674))
            ThreePointArc((44.82, -25.5125062674), (42.5, -30), (44.82, -34.4874937326))
            ThreePointArc((44.82, -34.4874937326), (44.9106009231, -34.4292665608), (45, -34.369210455))
        make_face()
        with BuildLine():
            ThreePointArc((47.5, -30), (46.8856934001, -27.4741338119), (45.18, -25.5125062674))
            ThreePointArc((45.18, -25.5125062674), (45.0893990769, -25.5707334392), (45, -25.630789545))
            ThreePointArc((45, -25.630789545), (46.6898827277, -27.5311946209), (47.3, -30))
            ThreePointArc((47.3, -30), (46.6898827277, -32.4688053791), (45, -34.369210455))
            ThreePointArc((45, -34.369210455), (45.0893990769, -34.4292665608), (45.18, -34.4874937326))
            ThreePointArc((45.18, -34.4874937326), (46.8856934001, -32.5258661881), (47.5, -30))
        make_face()
        with BuildLine():
            Line((45, -25.630789545), (45, -25.3902277714))
            ThreePointArc((45, -25.3902277714), (44.9093952036, -25.4504767291), (44.82, -25.5125062674))
            ThreePointArc((44.82, -25.5125062674), (44.9106009231, -25.5707334392), (45, -25.630789545))
        make_face()
    extrude(amount=F4_DEPTH)


with BuildPart() as f1_1:
    # F5: moved
    add(f1.part.rotate(Axis((-4.6097722286, -15, 1.25), (0, 0, -1)), F5_ANGLE))


with BuildPart() as f2_2:
    # F5: moved
    add(f2_1.part.rotate(Axis((-4.6097722286, -15, 1.25), (0, 0, -1)), F5_ANGLE))


with BuildPart() as f4_1:
    # F5: moved
    add(f4.part.rotate(Axis((-4.6097722286, -15, 1.25), (0, 0, -1)), F5_ANGLE))


with BuildPart() as f3_1:
    # F5: moved
    add(f3.part.rotate(Axis((-4.6097722286, -15, 1.25), (0, 0, -1)), F5_ANGLE))


with BuildPart() as f1_2:
    # F7: moved
    add(f1_1.part.rotate(Axis((-4.6097722286, -15, 1.25), (0, 0, -1)), F7_ANGLE))


with BuildPart() as f2_3:
    # F7: moved
    add(f2_2.part.rotate(Axis((-4.6097722286, -15, 1.25), (0, 0, -1)), F7_ANGLE))


with BuildPart() as f3_2:
    # F7: moved
    add(f3_1.part.rotate(Axis((-4.6097722286, -15, 1.25), (0, 0, -1)), F7_ANGLE))


with BuildPart() as f4_2:
    # F7: moved
    add(f4_1.part.rotate(Axis((-4.6097722286, -15, 1.25), (0, 0, -1)), F7_ANGLE))


solid = Compound([f1_2.part, f2_3.part, f3_2.part, f4_2.part])
